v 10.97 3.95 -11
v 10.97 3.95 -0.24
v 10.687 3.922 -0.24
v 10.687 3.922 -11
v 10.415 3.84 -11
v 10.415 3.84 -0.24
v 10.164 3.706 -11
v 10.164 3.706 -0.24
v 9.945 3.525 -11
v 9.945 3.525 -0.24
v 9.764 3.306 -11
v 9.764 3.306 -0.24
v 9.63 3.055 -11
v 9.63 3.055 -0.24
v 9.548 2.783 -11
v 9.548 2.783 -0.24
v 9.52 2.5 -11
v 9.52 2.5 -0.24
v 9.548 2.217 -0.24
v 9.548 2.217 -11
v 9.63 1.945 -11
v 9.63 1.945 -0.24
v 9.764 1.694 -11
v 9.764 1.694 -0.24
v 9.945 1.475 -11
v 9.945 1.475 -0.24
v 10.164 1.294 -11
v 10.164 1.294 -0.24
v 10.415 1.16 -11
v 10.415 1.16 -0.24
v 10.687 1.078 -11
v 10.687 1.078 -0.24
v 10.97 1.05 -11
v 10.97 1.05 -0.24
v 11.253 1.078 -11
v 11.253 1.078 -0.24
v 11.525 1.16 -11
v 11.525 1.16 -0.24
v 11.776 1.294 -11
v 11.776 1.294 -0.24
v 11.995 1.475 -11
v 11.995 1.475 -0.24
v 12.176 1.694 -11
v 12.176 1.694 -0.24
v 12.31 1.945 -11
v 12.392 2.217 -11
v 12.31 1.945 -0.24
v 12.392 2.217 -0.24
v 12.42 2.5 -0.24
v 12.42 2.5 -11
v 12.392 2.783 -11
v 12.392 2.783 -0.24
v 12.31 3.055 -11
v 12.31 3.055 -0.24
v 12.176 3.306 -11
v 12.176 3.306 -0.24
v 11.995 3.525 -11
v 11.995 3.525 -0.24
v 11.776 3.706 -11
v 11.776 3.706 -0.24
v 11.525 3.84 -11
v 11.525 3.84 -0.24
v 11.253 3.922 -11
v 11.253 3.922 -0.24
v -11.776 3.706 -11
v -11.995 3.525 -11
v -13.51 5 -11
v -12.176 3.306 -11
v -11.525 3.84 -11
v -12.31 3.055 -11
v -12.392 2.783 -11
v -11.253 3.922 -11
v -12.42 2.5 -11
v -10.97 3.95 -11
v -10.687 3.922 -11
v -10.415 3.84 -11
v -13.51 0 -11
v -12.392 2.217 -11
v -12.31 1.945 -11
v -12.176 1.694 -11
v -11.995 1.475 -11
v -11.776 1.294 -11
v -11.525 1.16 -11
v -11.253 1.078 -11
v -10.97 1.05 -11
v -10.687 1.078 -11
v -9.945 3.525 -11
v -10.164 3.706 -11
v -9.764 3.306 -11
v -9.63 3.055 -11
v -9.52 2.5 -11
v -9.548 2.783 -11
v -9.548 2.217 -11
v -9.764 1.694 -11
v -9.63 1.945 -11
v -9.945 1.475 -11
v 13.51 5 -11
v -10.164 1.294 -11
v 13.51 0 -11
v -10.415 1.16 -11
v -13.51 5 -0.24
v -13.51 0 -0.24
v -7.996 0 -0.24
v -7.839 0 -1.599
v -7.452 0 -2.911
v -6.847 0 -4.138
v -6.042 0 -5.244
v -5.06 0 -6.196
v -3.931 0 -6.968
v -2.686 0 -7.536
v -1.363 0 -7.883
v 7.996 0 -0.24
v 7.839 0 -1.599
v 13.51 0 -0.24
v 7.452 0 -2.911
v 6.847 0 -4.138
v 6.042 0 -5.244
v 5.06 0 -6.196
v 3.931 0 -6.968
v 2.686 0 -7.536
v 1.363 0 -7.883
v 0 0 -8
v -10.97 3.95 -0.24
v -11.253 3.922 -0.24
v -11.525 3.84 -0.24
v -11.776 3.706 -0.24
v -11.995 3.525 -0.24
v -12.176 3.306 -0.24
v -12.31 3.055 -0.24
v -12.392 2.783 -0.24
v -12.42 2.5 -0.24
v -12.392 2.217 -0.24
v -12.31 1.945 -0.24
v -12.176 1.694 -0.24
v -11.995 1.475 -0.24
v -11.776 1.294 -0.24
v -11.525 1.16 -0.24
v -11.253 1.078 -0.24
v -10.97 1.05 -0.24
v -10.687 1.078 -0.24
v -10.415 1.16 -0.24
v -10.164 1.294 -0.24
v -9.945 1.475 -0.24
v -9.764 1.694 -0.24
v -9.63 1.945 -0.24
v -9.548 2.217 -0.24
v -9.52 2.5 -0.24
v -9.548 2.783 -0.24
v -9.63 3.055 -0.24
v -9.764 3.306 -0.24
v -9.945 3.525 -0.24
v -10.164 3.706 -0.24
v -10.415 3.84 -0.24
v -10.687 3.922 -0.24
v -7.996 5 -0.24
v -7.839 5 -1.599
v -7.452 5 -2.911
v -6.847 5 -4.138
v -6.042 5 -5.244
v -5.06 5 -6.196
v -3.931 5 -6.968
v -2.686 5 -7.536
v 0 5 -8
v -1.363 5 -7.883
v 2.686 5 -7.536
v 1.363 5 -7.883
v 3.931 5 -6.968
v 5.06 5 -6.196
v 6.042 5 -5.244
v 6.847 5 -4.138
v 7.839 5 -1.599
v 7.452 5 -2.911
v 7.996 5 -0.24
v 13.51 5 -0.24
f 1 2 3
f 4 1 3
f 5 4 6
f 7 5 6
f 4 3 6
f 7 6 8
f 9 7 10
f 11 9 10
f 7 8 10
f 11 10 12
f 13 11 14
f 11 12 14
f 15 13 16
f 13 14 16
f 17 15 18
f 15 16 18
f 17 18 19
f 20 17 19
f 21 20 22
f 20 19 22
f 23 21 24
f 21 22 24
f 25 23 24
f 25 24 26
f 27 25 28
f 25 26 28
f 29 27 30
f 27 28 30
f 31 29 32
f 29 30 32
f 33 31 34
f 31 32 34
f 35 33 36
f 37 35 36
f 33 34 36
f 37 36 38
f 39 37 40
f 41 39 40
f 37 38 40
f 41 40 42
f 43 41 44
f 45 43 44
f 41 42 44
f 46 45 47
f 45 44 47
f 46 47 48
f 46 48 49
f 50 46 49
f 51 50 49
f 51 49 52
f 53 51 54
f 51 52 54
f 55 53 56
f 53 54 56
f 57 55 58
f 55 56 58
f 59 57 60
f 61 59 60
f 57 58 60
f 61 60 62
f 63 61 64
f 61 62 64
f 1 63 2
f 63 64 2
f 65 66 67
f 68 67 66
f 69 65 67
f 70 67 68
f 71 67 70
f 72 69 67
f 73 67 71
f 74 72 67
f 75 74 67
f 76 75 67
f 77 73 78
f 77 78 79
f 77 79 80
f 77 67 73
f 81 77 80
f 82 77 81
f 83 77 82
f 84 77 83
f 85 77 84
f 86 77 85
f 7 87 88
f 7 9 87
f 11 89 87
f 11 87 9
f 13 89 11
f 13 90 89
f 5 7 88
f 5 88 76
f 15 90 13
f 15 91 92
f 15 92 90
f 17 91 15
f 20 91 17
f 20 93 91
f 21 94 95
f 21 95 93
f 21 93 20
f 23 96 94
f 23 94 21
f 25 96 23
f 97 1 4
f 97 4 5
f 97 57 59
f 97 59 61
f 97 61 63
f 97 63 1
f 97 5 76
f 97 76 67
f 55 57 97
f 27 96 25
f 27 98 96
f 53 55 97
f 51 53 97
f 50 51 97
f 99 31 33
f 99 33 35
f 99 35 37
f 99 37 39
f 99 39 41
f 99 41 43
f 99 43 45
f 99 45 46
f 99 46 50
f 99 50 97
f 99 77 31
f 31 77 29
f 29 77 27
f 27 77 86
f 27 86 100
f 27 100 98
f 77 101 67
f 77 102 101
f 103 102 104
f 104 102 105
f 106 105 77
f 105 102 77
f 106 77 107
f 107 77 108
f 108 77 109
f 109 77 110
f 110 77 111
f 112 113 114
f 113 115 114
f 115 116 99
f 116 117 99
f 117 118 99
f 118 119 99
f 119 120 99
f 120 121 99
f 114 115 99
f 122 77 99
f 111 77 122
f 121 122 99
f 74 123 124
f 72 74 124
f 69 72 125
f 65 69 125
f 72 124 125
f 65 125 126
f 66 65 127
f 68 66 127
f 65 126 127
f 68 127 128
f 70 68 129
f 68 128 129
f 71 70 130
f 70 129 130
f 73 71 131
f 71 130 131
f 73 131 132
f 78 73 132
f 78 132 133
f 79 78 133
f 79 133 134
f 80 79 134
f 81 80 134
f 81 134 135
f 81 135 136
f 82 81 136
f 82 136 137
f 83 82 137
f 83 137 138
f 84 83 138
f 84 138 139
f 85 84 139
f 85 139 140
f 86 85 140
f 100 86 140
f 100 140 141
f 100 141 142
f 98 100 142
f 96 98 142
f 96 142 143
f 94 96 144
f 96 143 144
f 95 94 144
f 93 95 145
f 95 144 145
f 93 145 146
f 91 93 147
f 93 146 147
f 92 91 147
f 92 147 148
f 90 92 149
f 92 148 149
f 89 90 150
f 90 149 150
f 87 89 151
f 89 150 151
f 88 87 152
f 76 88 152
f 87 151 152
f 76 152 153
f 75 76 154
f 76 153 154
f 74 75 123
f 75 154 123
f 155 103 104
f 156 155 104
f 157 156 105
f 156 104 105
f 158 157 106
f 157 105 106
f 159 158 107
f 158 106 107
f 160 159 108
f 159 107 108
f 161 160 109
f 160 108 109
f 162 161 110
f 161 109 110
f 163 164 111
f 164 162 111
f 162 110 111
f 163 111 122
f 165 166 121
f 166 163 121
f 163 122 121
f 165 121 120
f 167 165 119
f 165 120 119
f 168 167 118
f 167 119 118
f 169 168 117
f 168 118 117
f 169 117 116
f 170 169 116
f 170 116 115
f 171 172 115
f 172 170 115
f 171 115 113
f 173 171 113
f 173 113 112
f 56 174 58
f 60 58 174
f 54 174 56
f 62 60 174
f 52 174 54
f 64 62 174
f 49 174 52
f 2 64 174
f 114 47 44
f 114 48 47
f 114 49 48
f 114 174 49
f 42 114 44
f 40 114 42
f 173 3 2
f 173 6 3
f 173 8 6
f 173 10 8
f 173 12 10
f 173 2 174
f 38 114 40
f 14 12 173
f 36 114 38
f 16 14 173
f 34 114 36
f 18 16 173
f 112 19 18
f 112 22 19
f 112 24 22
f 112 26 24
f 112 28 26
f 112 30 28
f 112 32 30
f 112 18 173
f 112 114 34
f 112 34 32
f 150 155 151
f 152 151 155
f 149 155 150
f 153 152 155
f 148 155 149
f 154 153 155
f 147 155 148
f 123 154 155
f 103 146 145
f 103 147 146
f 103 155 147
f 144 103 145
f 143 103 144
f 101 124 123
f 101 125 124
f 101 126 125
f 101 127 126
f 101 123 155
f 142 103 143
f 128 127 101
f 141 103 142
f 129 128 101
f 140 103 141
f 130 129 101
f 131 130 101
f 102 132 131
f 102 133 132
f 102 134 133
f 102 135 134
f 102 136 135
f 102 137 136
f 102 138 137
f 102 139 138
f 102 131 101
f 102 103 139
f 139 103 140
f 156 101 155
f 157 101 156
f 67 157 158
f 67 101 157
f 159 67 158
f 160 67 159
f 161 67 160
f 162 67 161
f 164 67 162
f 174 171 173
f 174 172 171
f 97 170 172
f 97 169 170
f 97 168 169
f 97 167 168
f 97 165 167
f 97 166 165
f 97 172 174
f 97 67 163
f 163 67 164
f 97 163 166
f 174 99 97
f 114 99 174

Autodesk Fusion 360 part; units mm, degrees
sketch "Sketch1" plane through (0, 0, 0) normal (0, 1, 0) x (1, 0, 0)
  circle A0 centre (0, 0) radius 8
  line L0 (-7.9964, 0.24) -> (-13.51, 0.24)
  line L1 (-13.51, 0.24) -> (-13.51, 11)
  line L2 (-13.51, 11) -> (13.51, 11)
  line L3 (13.51, 11) -> (13.51, 0.24)
  line L4 (13.51, 0.24) -> (7.9964, 0.24)
  point P0 (0, 8)
  dimension "d1" = 27.02
  dimension "d2" = 10.76
  dimension "d3" = 16
  dimension "d4" = 3
extrude "Extrude1" add sketch "Sketch1" along normal blind 5 contours A0 L0 L1 L2 L3 L4
sketch "Sketch2" plane through (0, 0, -11) normal (0, 0, -1) x (1, 0, 0)
  line L0 (13.51, 0) -> (-13.51, 0)
  line L1 (-13.51, 0) -> (-13.51, -5)
  line L2 (-13.51, -5) -> (13.51, -5)
  line L3 (13.51, -5) -> (13.51, 0)
  line L4 (-10.97, -2.5) -> (10.97, -2.5) construction
  point P0 (13.51, -2.5)
  point P1 (0, -2.5)
  dimension "d7" = 21.94
hole "Hole1" at (-10.97, 2.5, -11) at (10.97, 2.5, -11) direction (0, 0, 1) diameter 2.9 end through all
